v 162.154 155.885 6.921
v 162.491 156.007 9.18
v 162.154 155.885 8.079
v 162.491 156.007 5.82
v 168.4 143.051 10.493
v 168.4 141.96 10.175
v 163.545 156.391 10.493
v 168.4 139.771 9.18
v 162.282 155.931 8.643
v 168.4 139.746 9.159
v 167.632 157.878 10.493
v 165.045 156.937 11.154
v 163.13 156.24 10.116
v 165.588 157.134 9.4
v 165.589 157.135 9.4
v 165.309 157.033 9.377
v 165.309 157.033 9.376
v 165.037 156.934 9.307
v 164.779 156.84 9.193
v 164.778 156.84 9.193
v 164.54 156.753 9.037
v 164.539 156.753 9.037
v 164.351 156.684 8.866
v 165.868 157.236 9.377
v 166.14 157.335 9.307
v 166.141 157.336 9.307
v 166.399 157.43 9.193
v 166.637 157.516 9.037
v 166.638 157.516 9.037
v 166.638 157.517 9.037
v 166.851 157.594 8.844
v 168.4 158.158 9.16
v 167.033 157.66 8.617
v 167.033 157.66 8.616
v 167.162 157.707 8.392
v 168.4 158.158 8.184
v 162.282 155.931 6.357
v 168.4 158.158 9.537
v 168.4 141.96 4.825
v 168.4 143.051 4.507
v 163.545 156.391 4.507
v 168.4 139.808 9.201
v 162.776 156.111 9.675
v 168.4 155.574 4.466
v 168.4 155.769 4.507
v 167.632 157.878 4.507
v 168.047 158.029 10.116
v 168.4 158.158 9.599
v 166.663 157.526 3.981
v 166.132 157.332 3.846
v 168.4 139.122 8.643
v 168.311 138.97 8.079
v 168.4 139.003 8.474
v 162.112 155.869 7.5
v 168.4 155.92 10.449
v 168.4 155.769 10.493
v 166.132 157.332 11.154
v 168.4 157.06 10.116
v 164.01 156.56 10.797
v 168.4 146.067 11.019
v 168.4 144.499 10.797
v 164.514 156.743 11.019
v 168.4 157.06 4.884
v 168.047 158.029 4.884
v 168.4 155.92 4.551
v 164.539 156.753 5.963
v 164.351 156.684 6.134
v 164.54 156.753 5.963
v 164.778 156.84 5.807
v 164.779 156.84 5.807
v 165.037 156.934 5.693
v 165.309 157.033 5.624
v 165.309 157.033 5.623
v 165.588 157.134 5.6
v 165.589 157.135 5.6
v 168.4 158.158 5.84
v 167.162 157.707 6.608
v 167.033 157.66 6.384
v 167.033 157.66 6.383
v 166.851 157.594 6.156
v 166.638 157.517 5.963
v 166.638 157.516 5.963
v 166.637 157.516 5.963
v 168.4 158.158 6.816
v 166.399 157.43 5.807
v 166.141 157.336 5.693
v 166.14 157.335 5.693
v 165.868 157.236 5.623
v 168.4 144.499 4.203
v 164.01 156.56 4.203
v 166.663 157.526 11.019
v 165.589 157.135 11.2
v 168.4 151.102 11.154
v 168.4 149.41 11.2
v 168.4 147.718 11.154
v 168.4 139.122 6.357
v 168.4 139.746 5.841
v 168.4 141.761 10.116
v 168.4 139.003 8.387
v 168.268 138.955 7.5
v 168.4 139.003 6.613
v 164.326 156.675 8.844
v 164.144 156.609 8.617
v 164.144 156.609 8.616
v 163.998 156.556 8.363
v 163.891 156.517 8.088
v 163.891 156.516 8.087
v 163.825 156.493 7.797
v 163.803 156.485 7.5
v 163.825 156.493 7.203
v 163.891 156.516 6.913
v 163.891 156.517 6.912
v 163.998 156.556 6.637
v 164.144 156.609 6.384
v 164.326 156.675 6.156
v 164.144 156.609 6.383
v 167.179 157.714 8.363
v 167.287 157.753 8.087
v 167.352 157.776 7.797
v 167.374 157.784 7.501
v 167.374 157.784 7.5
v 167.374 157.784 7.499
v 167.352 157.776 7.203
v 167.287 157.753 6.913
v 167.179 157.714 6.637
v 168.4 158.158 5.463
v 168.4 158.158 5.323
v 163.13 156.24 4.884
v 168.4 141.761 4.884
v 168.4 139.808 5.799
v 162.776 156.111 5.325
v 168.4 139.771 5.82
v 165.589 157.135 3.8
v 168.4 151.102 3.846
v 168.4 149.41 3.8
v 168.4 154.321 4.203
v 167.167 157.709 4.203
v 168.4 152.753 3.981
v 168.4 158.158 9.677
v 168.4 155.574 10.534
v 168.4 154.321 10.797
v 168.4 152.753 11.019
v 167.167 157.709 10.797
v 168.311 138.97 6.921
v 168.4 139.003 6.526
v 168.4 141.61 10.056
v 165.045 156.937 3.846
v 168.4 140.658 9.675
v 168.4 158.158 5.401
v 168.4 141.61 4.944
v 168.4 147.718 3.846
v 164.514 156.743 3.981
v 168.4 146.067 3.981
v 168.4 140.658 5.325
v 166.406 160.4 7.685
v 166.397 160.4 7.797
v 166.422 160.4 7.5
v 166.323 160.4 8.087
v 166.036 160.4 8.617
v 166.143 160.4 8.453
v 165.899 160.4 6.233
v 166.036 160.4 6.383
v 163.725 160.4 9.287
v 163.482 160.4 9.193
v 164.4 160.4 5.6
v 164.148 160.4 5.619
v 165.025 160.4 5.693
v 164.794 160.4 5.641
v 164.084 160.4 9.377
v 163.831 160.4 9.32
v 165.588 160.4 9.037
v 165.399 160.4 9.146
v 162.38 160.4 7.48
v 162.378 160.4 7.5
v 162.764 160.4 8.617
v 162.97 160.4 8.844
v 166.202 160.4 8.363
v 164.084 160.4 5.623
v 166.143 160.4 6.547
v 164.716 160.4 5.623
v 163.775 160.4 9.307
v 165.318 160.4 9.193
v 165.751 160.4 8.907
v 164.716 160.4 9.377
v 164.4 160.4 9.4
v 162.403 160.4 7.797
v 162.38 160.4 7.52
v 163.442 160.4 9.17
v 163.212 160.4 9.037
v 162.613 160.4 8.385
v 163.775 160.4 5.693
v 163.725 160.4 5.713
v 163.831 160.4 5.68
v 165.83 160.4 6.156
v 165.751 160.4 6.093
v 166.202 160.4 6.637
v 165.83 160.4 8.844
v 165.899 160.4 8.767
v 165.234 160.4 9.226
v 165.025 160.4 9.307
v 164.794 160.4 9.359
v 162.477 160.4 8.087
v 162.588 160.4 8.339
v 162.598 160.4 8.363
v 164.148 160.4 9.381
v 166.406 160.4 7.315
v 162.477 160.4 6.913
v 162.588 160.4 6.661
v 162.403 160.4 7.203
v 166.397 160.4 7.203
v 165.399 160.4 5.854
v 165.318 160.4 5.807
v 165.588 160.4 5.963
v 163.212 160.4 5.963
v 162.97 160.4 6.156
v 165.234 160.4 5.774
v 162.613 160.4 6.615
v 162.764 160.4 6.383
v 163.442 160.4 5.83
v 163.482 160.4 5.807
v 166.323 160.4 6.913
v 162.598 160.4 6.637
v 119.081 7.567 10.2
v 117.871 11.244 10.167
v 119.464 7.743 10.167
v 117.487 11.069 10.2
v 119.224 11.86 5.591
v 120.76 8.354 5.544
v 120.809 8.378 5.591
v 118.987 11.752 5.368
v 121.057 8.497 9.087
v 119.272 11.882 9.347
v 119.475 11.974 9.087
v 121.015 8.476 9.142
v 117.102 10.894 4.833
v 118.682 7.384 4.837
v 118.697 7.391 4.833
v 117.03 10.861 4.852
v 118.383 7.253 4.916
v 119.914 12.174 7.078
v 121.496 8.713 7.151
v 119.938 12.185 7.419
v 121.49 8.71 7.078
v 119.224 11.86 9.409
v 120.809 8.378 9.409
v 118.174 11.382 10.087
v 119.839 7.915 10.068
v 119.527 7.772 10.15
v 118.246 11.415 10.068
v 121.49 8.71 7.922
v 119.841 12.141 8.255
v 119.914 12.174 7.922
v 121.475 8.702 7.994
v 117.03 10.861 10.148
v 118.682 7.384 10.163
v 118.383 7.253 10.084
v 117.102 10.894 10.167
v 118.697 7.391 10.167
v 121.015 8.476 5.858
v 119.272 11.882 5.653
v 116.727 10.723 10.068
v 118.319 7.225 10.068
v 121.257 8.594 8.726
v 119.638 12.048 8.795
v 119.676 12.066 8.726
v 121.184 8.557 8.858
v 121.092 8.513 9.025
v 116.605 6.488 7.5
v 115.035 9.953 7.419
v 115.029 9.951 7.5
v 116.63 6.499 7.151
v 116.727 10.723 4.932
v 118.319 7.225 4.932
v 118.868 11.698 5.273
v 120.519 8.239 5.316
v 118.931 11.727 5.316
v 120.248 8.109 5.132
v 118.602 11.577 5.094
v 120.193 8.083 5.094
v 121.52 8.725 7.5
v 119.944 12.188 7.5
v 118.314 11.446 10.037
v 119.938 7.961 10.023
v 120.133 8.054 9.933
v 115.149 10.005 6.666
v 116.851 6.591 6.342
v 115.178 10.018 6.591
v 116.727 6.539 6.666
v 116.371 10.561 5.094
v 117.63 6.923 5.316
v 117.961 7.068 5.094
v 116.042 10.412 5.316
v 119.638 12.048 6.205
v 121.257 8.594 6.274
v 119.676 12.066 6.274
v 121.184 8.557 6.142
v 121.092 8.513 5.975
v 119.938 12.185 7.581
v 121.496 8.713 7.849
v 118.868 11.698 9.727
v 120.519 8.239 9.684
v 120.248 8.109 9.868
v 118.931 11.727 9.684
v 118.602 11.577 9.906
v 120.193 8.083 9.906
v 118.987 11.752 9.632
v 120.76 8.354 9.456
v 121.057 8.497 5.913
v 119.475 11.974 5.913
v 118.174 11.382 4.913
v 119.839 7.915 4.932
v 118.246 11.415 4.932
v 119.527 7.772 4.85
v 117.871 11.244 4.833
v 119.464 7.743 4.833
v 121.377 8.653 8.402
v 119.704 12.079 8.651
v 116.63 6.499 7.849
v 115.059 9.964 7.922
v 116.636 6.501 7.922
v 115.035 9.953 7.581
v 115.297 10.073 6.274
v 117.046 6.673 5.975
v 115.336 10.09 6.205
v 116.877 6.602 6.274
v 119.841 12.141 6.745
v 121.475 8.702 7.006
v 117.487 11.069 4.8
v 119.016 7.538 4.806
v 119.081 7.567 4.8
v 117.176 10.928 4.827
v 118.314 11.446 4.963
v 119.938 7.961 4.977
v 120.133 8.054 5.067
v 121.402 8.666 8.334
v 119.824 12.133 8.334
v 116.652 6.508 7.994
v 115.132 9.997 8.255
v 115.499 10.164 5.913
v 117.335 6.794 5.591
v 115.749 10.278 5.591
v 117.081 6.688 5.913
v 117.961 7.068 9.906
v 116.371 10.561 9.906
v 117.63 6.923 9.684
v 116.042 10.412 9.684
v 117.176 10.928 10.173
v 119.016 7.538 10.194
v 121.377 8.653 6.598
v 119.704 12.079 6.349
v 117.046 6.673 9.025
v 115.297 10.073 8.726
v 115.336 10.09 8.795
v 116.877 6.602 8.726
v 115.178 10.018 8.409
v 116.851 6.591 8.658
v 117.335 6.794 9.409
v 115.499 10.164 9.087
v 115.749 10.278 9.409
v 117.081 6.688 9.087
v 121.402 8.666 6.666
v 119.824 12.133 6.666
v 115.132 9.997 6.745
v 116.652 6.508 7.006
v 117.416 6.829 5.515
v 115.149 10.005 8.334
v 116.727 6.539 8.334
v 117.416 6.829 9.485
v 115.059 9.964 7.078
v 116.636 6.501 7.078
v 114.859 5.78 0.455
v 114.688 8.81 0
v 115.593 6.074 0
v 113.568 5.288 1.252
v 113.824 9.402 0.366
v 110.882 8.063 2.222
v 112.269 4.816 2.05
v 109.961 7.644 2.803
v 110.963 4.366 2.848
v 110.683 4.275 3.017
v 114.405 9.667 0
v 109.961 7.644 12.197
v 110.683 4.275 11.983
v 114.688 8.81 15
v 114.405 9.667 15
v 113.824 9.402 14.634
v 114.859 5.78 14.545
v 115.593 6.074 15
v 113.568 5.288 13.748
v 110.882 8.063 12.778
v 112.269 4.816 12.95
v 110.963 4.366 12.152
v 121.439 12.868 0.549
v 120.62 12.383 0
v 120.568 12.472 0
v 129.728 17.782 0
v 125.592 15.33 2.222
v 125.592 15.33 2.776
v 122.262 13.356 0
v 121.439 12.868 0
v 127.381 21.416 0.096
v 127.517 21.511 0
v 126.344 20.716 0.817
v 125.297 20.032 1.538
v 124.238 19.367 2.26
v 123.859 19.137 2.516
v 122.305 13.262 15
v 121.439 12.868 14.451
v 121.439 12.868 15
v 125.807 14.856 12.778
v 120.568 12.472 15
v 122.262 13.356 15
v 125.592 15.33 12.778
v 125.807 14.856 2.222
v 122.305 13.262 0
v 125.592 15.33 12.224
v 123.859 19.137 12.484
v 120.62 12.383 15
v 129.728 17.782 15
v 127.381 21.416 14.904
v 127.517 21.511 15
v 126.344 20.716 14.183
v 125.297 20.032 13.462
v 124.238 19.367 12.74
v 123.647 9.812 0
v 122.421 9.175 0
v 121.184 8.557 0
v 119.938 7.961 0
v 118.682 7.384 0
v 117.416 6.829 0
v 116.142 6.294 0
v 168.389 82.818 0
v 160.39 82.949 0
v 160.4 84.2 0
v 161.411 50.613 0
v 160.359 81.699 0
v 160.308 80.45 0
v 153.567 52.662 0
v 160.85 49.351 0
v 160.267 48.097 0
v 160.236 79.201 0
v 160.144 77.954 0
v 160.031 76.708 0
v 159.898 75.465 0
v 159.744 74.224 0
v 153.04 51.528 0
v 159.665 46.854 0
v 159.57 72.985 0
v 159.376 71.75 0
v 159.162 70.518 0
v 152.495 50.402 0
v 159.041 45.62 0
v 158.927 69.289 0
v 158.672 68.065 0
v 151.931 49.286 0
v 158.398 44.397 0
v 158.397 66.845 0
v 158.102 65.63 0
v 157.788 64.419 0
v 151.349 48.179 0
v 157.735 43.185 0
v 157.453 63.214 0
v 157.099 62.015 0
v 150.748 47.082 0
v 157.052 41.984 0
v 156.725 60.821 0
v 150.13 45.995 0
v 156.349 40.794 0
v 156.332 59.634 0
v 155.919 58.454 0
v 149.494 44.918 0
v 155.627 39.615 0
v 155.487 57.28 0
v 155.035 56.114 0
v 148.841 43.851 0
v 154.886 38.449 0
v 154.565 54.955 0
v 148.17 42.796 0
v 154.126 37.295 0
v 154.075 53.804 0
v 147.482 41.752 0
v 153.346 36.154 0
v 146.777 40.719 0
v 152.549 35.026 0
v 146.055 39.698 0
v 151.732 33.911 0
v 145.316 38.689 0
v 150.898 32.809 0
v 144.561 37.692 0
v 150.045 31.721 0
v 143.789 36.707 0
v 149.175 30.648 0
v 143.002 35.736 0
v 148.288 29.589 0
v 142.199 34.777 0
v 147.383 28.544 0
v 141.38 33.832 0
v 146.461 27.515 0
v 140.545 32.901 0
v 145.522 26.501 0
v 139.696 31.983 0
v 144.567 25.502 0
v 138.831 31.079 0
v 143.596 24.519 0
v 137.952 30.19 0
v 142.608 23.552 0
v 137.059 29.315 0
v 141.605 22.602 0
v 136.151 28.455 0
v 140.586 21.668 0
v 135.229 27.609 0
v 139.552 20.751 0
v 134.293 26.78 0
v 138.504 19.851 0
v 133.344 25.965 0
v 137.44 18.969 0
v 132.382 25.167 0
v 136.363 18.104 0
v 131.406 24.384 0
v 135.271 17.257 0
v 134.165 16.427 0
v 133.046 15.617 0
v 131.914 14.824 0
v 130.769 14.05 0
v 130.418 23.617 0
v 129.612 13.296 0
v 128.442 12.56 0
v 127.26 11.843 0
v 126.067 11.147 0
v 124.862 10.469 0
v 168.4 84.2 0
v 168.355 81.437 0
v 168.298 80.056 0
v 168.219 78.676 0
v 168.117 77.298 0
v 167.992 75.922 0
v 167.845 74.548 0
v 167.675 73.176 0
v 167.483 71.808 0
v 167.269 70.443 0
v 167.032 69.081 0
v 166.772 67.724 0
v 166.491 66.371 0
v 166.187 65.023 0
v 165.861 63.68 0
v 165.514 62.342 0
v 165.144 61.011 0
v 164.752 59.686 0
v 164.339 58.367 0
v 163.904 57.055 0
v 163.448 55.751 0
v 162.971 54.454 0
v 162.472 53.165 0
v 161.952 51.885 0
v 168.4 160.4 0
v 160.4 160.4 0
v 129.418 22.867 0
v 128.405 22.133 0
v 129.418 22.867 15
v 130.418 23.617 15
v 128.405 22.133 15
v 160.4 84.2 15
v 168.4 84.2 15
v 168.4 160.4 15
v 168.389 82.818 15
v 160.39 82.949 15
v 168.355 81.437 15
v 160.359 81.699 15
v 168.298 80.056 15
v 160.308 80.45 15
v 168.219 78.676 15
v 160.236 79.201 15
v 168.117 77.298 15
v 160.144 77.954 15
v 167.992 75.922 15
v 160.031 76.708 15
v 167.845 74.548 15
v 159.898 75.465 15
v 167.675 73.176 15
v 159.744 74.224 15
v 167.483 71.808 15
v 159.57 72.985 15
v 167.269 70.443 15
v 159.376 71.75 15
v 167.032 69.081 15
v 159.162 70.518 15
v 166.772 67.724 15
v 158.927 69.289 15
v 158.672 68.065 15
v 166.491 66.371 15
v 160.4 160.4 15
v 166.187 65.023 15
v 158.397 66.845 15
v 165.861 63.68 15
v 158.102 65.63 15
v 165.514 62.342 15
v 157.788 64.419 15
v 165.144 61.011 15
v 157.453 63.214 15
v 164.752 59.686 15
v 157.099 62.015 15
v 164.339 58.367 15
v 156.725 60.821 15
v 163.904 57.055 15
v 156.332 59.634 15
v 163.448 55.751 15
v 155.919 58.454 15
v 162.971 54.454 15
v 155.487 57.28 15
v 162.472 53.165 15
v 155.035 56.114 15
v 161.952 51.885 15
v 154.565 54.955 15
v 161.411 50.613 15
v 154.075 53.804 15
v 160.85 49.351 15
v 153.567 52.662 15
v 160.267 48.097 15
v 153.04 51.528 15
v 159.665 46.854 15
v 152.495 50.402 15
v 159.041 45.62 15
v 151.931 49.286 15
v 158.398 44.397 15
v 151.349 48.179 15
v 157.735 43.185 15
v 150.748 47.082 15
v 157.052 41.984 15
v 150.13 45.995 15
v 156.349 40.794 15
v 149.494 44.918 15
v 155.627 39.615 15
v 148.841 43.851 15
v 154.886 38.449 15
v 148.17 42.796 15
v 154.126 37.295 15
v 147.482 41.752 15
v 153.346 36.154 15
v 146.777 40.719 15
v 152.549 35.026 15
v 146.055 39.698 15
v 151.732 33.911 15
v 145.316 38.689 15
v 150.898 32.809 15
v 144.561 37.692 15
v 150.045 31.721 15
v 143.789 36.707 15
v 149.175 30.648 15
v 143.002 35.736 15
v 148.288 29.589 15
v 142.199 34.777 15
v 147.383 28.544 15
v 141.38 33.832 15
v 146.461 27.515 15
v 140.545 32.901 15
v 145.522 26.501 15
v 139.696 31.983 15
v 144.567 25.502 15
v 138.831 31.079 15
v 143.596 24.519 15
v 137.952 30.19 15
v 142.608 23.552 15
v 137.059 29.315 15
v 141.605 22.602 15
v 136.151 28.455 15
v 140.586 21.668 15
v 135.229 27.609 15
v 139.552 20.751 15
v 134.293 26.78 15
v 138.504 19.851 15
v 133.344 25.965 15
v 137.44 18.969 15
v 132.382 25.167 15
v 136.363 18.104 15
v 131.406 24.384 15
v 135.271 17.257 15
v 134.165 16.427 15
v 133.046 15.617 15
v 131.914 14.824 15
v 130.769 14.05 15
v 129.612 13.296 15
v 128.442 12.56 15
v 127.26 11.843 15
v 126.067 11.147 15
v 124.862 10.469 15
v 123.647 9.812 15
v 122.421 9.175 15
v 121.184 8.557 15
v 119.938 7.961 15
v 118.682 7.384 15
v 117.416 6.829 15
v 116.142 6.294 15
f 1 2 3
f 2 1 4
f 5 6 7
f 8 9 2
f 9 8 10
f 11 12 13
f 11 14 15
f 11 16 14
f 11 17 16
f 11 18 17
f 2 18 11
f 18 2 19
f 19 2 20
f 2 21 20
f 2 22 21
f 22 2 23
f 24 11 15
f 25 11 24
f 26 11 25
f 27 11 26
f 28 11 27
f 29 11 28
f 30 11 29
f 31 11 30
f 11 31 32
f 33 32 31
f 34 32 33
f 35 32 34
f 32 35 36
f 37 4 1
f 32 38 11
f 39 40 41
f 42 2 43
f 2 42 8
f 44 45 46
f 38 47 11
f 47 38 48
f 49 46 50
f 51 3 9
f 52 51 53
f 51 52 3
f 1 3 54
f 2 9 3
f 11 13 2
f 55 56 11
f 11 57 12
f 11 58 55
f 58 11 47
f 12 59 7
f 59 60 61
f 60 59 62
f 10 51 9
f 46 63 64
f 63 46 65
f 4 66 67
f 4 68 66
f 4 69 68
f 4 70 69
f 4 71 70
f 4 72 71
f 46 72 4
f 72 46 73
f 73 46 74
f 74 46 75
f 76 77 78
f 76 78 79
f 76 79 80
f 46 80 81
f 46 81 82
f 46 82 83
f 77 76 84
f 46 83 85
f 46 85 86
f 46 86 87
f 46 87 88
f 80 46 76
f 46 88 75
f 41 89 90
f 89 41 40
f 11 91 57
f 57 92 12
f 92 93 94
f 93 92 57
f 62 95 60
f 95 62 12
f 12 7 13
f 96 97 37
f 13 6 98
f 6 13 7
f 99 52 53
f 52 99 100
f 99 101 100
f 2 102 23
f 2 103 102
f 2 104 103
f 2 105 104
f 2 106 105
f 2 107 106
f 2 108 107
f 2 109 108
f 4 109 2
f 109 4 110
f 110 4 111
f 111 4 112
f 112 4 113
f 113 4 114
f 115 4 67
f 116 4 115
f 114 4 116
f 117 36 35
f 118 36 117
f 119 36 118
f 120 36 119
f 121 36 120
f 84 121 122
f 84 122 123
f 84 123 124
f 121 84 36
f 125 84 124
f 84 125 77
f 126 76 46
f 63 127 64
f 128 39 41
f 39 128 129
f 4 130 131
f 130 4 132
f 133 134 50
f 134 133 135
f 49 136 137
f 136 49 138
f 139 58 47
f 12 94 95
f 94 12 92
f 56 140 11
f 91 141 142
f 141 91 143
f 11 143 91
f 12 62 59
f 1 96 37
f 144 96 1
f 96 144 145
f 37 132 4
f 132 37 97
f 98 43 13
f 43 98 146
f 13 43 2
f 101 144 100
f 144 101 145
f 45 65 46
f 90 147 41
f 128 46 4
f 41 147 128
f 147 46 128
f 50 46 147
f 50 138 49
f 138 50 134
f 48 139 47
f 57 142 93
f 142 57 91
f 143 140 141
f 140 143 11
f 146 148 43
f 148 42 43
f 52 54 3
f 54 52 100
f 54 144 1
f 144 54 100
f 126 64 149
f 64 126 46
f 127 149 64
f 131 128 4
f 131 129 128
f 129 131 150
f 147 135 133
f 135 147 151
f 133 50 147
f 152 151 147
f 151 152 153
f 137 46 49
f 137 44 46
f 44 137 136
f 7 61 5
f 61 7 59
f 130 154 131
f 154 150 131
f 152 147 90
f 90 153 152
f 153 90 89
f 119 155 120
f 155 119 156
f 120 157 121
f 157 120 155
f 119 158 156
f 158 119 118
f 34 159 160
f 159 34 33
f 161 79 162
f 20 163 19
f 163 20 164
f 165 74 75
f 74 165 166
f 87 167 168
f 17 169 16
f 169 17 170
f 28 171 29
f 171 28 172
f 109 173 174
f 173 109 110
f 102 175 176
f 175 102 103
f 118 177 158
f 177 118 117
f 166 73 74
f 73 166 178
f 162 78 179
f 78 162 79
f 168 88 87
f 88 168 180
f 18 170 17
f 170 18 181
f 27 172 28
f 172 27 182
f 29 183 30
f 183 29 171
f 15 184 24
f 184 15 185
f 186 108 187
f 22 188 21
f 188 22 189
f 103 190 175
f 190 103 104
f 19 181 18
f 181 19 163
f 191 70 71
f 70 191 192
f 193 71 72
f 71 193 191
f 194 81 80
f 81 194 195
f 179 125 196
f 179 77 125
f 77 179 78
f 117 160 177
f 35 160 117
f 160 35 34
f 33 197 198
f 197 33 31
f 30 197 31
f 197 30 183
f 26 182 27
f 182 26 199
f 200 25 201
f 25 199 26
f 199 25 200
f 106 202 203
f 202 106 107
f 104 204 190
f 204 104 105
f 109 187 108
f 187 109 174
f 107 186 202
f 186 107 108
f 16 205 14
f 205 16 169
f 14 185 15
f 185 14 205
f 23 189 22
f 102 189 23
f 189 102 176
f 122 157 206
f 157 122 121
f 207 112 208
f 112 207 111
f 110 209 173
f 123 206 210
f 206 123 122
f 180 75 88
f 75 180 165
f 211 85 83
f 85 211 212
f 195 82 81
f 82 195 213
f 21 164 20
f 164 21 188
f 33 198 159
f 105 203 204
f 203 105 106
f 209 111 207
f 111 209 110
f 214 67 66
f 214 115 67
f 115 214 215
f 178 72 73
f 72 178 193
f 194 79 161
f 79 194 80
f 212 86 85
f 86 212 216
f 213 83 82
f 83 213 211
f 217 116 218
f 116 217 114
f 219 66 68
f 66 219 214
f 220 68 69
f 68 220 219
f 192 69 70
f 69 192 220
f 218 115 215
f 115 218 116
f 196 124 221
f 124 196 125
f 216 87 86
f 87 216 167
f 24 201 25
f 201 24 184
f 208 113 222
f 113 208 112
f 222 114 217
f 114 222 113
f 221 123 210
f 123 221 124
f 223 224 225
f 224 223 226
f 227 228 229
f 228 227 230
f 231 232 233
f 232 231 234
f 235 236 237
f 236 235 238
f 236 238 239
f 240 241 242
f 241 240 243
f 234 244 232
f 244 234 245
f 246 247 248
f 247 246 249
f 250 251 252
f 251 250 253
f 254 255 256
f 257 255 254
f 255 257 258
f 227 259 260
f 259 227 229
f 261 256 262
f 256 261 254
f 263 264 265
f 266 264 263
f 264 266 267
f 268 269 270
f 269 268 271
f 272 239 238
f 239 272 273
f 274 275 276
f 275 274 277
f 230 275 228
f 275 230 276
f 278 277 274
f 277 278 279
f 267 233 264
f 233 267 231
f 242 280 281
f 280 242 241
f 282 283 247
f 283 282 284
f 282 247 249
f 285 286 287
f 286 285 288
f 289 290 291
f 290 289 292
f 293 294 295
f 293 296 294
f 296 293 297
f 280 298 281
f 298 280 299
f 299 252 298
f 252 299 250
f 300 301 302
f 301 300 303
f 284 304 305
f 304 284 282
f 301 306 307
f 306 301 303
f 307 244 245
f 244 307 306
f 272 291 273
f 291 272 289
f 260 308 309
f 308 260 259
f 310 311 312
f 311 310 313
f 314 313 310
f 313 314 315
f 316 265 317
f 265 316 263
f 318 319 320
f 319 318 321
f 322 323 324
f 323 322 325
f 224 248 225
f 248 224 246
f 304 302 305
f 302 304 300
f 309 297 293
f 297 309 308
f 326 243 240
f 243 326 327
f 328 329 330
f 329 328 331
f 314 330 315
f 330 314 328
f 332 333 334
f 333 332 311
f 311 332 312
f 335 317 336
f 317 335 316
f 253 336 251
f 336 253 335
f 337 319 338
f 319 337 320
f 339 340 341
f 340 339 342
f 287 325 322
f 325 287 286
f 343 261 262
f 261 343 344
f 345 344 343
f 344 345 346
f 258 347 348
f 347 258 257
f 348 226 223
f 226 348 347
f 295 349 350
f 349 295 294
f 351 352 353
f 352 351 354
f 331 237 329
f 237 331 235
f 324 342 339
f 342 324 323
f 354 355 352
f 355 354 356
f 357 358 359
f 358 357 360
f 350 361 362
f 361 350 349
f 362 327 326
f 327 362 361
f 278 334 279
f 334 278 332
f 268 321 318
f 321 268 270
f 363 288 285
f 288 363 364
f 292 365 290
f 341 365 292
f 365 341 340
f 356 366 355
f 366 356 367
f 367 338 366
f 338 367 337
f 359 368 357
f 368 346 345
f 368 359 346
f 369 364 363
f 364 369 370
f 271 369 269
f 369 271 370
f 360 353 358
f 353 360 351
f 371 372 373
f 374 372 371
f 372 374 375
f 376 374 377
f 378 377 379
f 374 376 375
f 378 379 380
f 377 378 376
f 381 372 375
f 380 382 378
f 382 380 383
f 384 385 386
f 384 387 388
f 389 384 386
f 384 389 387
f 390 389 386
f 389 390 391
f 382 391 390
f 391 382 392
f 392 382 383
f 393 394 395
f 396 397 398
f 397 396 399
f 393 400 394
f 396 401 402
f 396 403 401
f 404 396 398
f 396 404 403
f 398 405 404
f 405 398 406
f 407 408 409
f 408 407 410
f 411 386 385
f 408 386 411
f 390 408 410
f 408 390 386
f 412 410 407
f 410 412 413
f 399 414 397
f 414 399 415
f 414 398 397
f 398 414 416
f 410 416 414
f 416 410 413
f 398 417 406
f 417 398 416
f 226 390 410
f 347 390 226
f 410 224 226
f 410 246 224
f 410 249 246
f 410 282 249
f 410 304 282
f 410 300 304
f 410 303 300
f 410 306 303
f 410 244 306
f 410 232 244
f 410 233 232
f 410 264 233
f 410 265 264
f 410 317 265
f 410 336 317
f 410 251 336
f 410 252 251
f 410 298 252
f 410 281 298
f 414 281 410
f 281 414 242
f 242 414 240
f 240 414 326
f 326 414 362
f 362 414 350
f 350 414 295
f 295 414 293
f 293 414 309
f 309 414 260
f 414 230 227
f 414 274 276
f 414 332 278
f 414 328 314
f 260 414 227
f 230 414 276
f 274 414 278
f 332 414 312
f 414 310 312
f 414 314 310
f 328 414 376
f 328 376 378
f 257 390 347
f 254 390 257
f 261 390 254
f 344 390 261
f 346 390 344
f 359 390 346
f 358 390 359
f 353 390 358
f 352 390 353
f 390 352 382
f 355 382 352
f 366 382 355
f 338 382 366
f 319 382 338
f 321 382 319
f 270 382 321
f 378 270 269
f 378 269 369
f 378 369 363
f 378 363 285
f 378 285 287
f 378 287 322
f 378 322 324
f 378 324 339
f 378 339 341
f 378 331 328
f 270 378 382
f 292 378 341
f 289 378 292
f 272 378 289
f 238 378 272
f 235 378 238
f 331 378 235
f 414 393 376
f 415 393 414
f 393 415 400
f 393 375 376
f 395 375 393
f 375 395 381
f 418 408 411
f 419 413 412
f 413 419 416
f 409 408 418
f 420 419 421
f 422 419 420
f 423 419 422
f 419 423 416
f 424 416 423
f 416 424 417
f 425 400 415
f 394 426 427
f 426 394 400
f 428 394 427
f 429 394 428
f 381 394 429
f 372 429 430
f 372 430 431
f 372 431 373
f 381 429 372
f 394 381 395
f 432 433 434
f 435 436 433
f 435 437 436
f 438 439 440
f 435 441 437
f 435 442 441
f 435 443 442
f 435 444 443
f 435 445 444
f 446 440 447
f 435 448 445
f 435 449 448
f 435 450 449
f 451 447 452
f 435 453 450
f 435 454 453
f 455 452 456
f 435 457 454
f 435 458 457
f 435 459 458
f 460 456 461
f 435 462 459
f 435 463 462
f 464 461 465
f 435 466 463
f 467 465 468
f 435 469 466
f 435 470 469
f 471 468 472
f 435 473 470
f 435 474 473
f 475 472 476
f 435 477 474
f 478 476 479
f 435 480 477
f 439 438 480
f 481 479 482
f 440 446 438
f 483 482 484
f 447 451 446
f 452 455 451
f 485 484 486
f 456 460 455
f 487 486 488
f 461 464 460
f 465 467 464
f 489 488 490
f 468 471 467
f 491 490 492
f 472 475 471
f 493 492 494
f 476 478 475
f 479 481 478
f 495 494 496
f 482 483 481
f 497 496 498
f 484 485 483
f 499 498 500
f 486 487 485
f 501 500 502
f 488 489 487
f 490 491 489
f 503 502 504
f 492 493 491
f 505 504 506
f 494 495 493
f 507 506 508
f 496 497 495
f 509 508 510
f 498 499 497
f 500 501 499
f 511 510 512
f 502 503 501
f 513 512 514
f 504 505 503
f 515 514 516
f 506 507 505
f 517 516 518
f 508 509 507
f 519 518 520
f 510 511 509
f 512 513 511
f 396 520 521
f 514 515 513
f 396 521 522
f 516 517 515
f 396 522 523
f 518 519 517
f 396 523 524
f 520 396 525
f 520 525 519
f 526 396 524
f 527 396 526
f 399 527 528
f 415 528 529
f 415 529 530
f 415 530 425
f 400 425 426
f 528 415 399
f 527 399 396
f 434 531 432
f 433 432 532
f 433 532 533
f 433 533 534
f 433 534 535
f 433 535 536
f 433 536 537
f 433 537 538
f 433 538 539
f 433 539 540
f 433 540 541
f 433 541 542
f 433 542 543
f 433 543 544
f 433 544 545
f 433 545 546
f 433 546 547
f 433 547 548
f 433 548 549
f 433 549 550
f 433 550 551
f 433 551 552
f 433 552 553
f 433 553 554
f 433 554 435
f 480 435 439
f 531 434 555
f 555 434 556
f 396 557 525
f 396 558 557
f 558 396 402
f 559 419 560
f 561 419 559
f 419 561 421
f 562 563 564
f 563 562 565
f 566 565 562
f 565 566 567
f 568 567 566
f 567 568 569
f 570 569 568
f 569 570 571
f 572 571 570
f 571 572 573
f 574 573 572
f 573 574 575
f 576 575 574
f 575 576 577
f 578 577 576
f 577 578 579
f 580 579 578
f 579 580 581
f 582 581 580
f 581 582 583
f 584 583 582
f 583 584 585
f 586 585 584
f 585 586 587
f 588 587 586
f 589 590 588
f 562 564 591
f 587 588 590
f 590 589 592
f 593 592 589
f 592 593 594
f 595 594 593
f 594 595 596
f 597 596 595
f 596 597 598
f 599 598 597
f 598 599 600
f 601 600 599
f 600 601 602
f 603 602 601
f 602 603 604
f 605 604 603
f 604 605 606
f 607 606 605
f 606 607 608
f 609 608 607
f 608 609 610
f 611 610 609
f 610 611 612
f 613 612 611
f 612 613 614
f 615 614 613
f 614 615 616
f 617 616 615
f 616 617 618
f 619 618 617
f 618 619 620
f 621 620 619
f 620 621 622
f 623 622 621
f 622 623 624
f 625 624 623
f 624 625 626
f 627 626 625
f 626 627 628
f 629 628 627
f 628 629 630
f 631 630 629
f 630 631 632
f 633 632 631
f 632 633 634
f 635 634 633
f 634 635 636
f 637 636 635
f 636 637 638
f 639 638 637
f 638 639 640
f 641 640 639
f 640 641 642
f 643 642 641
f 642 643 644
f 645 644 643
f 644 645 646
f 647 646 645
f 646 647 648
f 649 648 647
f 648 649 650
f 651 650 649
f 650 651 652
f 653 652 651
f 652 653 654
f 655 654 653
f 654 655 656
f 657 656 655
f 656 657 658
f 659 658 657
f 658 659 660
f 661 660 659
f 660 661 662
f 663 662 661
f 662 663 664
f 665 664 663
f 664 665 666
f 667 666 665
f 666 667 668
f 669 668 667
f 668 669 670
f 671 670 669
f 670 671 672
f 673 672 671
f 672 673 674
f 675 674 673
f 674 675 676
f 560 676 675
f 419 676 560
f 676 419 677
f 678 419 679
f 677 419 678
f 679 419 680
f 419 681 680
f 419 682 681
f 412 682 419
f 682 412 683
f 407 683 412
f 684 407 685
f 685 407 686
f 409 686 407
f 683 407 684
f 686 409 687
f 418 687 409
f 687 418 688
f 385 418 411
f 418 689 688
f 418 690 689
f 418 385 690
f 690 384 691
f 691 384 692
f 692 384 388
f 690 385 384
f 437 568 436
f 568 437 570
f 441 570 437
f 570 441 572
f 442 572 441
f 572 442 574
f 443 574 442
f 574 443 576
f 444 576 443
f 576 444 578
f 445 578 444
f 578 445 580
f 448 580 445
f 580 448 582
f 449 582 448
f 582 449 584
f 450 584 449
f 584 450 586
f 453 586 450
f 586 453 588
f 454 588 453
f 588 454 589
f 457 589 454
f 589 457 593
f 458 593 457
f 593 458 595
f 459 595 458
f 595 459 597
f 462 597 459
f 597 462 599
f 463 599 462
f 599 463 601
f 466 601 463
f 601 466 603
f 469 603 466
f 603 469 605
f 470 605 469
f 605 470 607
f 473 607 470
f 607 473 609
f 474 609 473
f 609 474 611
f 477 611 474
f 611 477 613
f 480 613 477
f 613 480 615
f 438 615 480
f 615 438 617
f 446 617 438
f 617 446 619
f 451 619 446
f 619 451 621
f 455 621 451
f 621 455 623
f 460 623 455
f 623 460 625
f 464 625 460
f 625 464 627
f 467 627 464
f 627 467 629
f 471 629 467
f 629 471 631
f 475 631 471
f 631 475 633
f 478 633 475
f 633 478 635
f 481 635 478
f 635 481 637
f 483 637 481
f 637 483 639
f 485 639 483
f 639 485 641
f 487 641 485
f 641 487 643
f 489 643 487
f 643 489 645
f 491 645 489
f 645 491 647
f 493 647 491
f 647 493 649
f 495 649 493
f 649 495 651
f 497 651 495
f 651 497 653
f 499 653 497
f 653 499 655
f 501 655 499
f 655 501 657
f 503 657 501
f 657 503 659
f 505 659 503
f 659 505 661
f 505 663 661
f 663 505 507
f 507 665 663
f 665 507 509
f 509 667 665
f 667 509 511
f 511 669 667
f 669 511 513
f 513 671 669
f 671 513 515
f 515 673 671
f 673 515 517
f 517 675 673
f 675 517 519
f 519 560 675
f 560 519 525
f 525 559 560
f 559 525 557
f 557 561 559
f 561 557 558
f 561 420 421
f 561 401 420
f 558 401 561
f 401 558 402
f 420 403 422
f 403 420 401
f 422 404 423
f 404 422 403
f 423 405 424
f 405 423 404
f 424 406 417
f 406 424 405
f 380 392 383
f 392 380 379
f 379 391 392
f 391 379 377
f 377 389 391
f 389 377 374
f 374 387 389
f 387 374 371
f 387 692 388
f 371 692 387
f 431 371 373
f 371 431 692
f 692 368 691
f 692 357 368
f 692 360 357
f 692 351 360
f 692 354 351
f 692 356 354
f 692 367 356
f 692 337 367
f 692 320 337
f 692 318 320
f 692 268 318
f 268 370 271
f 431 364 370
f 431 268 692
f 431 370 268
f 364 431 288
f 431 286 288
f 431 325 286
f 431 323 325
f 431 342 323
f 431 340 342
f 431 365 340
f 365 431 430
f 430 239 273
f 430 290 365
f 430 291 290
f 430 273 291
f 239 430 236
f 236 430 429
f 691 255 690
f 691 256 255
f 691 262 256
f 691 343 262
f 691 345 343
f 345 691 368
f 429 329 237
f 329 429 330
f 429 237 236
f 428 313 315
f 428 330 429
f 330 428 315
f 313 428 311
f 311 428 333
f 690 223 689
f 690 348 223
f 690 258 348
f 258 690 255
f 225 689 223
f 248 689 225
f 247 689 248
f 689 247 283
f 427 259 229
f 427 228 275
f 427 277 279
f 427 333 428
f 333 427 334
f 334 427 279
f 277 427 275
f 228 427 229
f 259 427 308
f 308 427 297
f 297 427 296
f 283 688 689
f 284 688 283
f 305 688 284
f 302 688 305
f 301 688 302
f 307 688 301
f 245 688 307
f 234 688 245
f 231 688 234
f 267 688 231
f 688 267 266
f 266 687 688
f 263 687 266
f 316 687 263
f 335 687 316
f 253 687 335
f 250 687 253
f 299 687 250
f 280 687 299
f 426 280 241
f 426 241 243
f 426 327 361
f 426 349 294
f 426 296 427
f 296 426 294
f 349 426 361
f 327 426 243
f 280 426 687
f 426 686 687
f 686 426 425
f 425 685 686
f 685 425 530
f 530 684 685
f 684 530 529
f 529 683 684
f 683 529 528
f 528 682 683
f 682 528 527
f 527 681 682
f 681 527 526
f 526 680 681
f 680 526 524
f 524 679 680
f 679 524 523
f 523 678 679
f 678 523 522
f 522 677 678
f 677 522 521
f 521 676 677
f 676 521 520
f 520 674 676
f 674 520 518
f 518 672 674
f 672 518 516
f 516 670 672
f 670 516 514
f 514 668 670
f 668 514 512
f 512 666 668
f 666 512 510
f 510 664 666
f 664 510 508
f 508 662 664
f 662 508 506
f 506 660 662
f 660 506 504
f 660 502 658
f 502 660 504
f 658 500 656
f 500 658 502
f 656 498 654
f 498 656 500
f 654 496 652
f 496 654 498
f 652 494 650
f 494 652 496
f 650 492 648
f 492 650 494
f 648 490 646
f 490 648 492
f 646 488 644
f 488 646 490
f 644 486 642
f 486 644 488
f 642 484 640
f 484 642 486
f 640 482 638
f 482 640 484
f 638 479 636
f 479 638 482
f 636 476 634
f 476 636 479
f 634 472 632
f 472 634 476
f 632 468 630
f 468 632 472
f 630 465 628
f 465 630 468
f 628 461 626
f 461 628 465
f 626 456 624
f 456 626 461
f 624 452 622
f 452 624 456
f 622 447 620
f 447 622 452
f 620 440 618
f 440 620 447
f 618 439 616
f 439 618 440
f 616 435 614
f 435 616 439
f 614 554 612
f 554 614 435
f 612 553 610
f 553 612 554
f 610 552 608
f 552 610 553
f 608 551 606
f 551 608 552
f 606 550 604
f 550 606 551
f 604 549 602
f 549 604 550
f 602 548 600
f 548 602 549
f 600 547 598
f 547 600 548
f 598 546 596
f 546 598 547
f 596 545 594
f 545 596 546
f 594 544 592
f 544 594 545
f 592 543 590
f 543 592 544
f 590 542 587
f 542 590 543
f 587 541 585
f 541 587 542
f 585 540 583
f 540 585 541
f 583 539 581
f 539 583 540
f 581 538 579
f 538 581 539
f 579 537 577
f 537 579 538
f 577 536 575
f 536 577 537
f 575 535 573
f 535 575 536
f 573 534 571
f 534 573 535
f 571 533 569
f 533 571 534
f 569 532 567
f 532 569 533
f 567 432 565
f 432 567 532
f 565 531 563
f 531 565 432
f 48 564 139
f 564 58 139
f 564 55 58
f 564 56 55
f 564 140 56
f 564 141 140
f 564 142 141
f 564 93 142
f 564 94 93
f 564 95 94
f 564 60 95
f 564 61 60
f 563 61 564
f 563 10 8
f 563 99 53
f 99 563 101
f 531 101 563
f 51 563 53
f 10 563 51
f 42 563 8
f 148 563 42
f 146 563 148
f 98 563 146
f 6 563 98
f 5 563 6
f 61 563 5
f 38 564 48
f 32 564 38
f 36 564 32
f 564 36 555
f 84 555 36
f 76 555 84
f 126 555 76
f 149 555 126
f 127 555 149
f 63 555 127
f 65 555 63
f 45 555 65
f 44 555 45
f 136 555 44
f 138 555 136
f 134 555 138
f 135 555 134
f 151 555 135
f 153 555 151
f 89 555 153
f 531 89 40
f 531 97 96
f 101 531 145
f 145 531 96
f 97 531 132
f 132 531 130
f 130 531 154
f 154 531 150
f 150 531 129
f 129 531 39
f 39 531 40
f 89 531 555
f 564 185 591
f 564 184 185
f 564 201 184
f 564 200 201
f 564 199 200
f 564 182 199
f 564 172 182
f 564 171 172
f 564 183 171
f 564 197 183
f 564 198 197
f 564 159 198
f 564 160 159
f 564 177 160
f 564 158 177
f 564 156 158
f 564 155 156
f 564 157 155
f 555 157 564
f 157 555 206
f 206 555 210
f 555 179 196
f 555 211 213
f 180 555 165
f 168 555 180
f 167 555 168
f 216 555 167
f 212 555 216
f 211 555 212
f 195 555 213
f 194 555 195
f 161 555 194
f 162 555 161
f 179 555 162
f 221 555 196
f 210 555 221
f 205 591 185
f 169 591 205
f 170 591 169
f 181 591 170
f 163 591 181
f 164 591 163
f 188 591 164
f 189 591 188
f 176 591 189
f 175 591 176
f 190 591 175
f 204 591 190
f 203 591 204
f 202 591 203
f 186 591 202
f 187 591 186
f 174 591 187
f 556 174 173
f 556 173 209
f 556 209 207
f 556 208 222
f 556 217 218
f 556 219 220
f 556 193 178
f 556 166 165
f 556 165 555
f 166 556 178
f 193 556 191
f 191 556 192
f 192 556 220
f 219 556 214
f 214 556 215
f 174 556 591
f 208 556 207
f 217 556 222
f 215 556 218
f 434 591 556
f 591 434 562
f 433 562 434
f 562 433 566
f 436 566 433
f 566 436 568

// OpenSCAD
include <../lib/under-desk-cord-protector-lib.scad>;
$fn = 40;
prop_beam();
